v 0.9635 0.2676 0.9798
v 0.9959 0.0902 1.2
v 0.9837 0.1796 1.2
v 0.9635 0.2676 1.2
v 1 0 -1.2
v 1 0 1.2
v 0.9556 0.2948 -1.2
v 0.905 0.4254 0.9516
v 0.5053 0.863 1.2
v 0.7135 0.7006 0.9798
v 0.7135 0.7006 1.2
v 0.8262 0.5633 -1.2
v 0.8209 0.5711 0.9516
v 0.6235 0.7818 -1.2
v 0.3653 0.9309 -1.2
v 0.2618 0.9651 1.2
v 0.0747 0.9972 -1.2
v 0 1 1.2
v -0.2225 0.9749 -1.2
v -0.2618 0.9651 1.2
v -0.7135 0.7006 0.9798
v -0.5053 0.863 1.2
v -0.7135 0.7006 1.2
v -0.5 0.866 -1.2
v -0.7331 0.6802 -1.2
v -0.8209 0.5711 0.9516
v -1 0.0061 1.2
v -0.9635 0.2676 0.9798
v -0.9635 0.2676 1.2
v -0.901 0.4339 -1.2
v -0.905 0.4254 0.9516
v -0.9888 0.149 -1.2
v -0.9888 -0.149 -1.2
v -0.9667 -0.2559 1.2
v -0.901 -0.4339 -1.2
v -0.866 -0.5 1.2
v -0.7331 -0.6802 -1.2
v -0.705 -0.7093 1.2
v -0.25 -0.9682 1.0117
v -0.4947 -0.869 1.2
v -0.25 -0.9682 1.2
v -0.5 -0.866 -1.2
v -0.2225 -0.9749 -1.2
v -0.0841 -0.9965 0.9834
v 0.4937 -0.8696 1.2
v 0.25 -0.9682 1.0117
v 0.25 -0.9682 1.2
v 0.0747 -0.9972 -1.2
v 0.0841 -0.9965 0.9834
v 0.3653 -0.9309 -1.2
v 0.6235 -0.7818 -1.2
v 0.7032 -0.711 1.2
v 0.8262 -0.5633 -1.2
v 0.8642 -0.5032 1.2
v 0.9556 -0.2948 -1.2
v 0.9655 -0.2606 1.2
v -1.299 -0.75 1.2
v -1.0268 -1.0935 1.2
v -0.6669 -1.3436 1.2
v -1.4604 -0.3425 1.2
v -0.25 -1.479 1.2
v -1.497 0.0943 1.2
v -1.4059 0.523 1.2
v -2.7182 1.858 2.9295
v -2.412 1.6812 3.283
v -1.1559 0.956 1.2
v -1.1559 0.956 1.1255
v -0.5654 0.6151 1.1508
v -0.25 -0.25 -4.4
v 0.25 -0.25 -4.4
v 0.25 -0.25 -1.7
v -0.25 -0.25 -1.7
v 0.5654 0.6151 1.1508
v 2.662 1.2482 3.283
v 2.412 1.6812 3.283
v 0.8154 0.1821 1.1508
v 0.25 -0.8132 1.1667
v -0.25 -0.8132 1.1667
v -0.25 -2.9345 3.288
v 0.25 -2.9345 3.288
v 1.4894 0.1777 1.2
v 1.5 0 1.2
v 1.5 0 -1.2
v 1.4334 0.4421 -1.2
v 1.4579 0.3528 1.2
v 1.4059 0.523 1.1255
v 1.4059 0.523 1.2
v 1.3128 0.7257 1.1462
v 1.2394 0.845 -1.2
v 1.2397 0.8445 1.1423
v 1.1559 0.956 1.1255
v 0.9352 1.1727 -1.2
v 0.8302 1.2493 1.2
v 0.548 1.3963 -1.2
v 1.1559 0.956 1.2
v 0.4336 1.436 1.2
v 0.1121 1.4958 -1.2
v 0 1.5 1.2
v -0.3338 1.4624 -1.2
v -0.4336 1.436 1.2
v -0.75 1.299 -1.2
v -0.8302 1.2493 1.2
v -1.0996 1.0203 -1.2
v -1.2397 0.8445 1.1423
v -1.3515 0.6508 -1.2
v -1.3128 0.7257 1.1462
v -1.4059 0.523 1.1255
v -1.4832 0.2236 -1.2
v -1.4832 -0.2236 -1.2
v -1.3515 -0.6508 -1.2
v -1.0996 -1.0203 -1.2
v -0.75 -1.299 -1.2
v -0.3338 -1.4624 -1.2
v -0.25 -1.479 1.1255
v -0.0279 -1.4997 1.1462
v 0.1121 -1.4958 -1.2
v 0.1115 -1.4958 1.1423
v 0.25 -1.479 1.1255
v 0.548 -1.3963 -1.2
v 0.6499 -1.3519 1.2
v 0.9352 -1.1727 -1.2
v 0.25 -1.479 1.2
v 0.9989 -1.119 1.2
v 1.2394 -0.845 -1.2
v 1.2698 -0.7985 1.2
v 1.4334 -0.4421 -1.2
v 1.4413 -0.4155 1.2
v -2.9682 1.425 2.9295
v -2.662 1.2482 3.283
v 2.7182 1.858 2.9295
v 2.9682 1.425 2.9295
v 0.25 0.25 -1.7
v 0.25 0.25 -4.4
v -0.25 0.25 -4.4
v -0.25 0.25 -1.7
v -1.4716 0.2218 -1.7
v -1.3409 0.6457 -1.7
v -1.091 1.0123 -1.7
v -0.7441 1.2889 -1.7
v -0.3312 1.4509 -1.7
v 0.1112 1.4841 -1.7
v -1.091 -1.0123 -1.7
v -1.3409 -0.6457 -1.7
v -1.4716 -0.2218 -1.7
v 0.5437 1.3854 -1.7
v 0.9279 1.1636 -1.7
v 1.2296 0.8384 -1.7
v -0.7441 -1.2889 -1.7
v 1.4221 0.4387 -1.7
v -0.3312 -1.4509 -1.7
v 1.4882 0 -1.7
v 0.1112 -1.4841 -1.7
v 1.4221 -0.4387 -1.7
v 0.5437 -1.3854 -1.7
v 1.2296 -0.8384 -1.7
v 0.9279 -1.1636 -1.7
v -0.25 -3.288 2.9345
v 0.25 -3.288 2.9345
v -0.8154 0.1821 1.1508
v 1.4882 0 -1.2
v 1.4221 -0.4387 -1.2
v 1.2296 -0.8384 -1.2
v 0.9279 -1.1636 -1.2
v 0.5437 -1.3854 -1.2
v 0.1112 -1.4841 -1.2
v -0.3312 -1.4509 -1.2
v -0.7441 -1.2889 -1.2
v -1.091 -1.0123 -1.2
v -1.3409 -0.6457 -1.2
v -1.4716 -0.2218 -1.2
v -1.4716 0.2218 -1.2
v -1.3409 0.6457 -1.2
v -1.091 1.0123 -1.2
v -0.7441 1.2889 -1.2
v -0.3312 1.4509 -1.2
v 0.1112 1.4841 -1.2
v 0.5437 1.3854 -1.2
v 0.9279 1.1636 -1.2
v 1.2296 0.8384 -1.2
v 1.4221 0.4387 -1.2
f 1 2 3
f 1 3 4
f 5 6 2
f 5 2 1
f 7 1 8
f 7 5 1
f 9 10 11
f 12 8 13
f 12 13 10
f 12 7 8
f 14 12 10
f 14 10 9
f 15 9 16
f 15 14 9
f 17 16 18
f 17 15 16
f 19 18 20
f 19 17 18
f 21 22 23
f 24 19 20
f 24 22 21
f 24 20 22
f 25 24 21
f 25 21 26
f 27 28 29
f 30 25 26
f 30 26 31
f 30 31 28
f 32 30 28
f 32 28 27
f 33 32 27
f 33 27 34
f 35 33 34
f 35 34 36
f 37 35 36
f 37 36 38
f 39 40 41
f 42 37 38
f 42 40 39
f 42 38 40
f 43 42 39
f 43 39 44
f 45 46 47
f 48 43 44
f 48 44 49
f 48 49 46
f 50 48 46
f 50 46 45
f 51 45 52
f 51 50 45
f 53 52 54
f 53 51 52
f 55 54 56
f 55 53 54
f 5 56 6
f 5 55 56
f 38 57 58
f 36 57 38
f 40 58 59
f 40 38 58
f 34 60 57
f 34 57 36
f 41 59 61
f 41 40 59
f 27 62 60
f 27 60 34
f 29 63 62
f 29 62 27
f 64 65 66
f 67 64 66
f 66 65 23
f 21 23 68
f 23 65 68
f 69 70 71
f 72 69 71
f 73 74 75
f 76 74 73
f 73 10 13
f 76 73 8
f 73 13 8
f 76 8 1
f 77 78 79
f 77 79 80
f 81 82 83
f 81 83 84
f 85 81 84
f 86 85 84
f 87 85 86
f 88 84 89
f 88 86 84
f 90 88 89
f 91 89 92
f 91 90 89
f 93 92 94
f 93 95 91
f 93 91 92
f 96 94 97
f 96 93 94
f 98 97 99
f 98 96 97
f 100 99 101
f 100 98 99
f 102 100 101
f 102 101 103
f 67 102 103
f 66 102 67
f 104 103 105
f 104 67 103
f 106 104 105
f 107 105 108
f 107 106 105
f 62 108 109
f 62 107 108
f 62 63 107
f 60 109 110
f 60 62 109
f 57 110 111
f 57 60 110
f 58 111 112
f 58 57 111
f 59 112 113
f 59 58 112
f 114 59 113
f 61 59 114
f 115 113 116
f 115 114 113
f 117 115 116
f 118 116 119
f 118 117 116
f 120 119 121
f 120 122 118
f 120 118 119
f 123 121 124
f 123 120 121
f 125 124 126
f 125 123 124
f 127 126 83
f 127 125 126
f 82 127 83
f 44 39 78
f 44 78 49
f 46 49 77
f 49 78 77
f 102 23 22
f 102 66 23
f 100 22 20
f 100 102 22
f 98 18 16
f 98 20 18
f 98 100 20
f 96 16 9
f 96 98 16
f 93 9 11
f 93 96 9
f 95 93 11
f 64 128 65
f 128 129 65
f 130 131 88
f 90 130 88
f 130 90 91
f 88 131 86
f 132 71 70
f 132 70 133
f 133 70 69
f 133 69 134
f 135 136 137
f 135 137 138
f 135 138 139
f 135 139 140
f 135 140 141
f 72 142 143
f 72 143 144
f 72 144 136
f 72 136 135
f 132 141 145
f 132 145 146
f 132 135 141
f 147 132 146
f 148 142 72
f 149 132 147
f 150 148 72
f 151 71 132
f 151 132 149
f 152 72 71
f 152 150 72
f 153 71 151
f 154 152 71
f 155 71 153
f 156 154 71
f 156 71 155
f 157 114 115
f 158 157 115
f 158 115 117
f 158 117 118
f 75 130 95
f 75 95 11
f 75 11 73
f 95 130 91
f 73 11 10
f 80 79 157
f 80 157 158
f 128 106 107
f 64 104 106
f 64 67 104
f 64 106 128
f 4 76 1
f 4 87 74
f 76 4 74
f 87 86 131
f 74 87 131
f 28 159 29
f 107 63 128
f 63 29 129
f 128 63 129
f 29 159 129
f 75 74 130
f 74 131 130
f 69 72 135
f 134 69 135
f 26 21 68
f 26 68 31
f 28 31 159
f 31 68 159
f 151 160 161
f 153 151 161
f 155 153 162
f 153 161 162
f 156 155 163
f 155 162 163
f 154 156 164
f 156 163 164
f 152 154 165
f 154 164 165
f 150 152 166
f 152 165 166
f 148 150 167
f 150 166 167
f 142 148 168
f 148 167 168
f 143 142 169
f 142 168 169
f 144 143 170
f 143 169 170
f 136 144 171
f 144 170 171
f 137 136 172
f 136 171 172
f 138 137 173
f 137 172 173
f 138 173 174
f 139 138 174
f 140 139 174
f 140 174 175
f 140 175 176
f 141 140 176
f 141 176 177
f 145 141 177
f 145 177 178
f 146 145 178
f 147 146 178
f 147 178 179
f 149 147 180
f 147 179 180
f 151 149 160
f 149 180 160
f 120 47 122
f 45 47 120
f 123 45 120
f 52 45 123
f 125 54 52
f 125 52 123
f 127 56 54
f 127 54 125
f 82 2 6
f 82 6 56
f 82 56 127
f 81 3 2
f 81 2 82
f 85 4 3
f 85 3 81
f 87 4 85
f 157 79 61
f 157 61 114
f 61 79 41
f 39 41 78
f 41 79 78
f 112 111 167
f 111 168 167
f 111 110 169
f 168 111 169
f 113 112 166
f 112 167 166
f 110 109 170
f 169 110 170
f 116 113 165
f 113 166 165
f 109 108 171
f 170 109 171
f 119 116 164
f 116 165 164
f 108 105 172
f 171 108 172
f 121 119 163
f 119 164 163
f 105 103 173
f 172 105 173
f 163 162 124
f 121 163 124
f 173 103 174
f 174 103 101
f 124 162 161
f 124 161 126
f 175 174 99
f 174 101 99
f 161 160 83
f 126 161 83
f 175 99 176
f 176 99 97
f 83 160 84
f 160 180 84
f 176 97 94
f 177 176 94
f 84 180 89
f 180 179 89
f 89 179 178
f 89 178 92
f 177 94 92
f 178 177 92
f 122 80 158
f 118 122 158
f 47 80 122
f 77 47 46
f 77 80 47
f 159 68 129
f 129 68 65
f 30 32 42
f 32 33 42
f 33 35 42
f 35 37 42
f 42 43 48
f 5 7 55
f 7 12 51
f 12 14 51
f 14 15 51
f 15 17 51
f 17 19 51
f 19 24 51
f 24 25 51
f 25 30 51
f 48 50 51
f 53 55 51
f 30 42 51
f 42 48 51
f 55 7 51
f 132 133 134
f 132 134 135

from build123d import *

# Parameters (mm, degrees)
SKETCH_R     = 1.5
SKETCH_R_2   = 1
PAD_DEPTH    = 1.2
SKETCH001_R  = 1.488237
PAD001_DEPTH = 0.5
SKETCH002_W  = 0.5
SKETCH002_H  = 2.7
PAD002_DEPTH = 0.25
SKETCH003_W  = 0.5
SKETCH003_H  = 3
PAD003_DEPTH = 0.25
PAD004_DEPTH = 0.25
PAD005_DEPTH = 0.25


with BuildPart() as part:
    # Sketch → Pad (new body, symmetric)
    with BuildSketch(Plane.XY):
        Circle(SKETCH_R)
        Circle(SKETCH_R_2, mode=Mode.SUBTRACT)
    extrude(amount=PAD_DEPTH, both=True)

    # Sketch001 (on Face3 of Pad) → Pad001 (join)
    with BuildSketch(Plane(origin=(0, 0, -1.2), x_dir=(1, 0, 0), z_dir=(0, 0, -1))):
        Circle(SKETCH001_R)
    extrude(amount=PAD001_DEPTH)

    # Sketch002 → Pad002 (join, symmetric)
    with BuildSketch(Plane.YZ):
        with Locations((0, -3.05)):
            Rectangle(SKETCH002_W, SKETCH002_H)
    extrude(amount=PAD002_DEPTH, both=True)

    # Sketch003 (on Face1 of CopyRuled_Surface) → Pad003 (join, symmetric)
    with BuildSketch(Plane(origin=(0, 0, 0), x_dir=(1, 0, 0), z_dir=(0, 0.707107, 0.707107))):
        with Locations((0, -2.9)):
            Rectangle(SKETCH003_W, SKETCH003_H)
    extrude(amount=PAD003_DEPTH, both=True)

    # Sketch004 (on CopyRuled_Surface) → Pad004 (join, symmetric)
    with BuildSketch(Plane(origin=(0, 0, 0), x_dir=(0.790569, -0.273861, 0.547723), z_dir=(0.612372, 0.353553, -0.707107))):
        Polygon((1.225119, -0.677557), (3.560833, -2.58466), (3.244606, -2.971958), (0.908891, -1.064855), align=None)
    extrude(amount=PAD004_DEPTH, both=True)

    # Sketch005 (on Face1 of CopyRuled_Surface002) → Pad005 (join, symmetric)
    with BuildSketch(Plane(origin=(0, 0, 0), x_dir=(0.790569, 0.273861, -0.547723), z_dir=(0.612372, -0.353553, 0.707107))):
        Polygon((-1.225119, 0.677557), (-3.560833, 2.58466), (-3.244606, 2.971958), (-0.908891, 1.064855), align=None)
    extrude(amount=PAD005_DEPTH, both=True)


solid = part.part
